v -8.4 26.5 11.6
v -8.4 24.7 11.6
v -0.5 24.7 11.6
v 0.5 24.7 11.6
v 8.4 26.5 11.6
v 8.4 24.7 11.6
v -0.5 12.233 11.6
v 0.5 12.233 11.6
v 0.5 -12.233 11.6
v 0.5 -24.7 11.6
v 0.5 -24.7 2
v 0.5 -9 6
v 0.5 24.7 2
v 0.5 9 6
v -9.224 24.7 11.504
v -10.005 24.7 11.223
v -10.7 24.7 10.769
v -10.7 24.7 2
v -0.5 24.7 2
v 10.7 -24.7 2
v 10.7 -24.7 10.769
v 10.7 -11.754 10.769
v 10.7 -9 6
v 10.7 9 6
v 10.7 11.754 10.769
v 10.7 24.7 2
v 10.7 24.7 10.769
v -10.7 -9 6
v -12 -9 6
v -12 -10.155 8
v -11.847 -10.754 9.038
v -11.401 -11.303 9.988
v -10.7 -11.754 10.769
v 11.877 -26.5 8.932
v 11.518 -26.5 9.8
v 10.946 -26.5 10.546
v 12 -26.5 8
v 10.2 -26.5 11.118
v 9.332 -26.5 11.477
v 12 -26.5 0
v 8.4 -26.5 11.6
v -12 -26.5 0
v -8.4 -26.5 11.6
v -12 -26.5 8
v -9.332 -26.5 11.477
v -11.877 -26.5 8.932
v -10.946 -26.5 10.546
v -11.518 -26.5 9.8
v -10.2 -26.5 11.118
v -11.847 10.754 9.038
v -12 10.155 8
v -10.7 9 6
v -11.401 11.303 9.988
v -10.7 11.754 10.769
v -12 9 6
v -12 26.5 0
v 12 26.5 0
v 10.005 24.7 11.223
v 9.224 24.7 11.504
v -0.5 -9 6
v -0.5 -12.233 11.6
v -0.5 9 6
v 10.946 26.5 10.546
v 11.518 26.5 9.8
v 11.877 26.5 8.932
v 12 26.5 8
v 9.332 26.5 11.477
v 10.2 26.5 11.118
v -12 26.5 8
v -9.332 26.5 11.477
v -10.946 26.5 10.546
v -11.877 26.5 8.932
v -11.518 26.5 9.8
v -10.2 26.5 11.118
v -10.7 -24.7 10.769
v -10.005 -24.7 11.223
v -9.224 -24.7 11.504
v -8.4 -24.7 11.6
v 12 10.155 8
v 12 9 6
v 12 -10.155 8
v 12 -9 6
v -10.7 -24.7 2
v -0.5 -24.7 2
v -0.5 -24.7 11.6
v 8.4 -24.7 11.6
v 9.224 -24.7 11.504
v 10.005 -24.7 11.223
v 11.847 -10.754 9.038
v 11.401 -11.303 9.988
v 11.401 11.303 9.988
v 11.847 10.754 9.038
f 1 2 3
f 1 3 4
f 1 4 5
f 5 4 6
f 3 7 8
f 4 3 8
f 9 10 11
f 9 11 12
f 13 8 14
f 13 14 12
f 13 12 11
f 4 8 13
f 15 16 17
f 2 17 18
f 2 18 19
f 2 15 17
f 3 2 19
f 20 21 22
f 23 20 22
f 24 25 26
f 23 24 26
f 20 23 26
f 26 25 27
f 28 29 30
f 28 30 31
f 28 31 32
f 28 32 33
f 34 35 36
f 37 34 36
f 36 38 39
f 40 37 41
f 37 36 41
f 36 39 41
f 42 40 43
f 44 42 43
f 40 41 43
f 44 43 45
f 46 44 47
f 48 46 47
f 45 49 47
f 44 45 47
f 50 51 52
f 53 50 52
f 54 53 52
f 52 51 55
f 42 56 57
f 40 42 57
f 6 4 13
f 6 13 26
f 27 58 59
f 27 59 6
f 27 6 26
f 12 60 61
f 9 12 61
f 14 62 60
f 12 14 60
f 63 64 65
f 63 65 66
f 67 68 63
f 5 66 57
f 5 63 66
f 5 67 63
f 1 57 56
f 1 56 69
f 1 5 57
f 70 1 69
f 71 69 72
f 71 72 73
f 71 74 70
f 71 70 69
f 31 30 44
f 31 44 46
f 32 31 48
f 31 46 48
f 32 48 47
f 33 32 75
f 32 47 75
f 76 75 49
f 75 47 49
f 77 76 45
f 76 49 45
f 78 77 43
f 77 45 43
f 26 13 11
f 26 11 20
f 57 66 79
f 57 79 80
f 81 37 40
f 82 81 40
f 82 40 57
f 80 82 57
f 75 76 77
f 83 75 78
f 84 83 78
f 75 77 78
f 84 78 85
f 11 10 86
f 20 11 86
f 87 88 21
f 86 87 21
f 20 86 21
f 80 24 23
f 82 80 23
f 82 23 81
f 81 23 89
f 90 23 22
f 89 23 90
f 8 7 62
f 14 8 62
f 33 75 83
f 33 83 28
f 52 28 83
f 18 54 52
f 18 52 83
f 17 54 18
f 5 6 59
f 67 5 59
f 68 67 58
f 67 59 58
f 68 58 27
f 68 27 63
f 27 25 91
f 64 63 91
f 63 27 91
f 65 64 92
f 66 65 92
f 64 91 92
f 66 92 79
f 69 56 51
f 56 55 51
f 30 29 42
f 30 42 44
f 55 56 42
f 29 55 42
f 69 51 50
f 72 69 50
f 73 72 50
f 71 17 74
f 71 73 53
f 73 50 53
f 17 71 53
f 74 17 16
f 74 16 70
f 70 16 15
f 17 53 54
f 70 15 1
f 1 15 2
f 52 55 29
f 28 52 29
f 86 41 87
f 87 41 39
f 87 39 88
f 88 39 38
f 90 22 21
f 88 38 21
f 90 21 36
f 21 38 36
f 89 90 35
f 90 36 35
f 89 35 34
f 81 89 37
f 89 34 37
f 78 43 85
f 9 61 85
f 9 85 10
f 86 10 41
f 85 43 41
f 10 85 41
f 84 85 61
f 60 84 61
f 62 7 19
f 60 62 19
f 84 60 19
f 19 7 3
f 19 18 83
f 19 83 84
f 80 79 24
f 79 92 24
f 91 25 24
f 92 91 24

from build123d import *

# Parameters (mm, degrees)
SKETCH1_W               = 24
SKETCH1_H               = 53
BOSS_EXTRUDE1_DEPTH     = 2
BOSS_EXTRUDE2_DEPTH     = 53
SKETCH3_W               = 10.2
SKETCH3_H               = 49.4
CUT_EXTRUDE1_DEPTH      = 9.6
CUT_EXTRUDE2_DEPTH      = 32.317886263
CUT_EXTRUDE2_DEPTH_BACK = 32.317886263


with BuildPart() as part:
    # Sketch1 → Boss-Extrude1 (new body)
    with BuildSketch(Plane.XY):
        Rectangle(SKETCH1_W, SKETCH1_H)
    extrude(amount=BOSS_EXTRUDE1_DEPTH)

    # Sketch2 → Boss-Extrude2 (add)
    with BuildSketch(Plane.XZ.offset(26.5)):
        with BuildLine():
            Line((-8.4, 11.6), (8.4, 11.6))
            ThreePointArc((8.4, 11.6), (10.945584412, 10.545584412), (12, 8))
            Line((12, 8), (12, 2))
            Line((12, 2), (-12, 2))
            Line((-12, 2), (-12, 8))
            ThreePointArc((-12, 8), (-10.945584412, 10.545584412), (-8.4, 11.6))
        make_face()
    extrude(amount=-BOSS_EXTRUDE2_DEPTH)

    # Sketch3 → Cut-Extrude1 (cut)
    with BuildSketch(Plane.XY.offset(11.6)):
        with Locations((5.6, 0)):
            Rectangle(SKETCH3_W, SKETCH3_H)
        with Locations((-5.6, 0)):
            Rectangle(SKETCH3_W, SKETCH3_H)
    extrude(amount=-CUT_EXTRUDE1_DEPTH, mode=Mode.SUBTRACT)

    # Sketch4 → Cut-Extrude2 (cut, two sides: drawn at the far end of the back side and taken through both)
    with BuildSketch(Plane(origin=(0, 0, 0), x_dir=(0, 0, -1), z_dir=(1, 0, 0)).offset(-CUT_EXTRUDE2_DEPTH_BACK)):
        Polygon((-16.6, -15.119912853), (-16.6, 15.119912853), (-6, 9), (-6, -9), align=None)
    extrude(amount=CUT_EXTRUDE2_DEPTH + CUT_EXTRUDE2_DEPTH_BACK, mode=Mode.SUBTRACT)


solid = part.part
